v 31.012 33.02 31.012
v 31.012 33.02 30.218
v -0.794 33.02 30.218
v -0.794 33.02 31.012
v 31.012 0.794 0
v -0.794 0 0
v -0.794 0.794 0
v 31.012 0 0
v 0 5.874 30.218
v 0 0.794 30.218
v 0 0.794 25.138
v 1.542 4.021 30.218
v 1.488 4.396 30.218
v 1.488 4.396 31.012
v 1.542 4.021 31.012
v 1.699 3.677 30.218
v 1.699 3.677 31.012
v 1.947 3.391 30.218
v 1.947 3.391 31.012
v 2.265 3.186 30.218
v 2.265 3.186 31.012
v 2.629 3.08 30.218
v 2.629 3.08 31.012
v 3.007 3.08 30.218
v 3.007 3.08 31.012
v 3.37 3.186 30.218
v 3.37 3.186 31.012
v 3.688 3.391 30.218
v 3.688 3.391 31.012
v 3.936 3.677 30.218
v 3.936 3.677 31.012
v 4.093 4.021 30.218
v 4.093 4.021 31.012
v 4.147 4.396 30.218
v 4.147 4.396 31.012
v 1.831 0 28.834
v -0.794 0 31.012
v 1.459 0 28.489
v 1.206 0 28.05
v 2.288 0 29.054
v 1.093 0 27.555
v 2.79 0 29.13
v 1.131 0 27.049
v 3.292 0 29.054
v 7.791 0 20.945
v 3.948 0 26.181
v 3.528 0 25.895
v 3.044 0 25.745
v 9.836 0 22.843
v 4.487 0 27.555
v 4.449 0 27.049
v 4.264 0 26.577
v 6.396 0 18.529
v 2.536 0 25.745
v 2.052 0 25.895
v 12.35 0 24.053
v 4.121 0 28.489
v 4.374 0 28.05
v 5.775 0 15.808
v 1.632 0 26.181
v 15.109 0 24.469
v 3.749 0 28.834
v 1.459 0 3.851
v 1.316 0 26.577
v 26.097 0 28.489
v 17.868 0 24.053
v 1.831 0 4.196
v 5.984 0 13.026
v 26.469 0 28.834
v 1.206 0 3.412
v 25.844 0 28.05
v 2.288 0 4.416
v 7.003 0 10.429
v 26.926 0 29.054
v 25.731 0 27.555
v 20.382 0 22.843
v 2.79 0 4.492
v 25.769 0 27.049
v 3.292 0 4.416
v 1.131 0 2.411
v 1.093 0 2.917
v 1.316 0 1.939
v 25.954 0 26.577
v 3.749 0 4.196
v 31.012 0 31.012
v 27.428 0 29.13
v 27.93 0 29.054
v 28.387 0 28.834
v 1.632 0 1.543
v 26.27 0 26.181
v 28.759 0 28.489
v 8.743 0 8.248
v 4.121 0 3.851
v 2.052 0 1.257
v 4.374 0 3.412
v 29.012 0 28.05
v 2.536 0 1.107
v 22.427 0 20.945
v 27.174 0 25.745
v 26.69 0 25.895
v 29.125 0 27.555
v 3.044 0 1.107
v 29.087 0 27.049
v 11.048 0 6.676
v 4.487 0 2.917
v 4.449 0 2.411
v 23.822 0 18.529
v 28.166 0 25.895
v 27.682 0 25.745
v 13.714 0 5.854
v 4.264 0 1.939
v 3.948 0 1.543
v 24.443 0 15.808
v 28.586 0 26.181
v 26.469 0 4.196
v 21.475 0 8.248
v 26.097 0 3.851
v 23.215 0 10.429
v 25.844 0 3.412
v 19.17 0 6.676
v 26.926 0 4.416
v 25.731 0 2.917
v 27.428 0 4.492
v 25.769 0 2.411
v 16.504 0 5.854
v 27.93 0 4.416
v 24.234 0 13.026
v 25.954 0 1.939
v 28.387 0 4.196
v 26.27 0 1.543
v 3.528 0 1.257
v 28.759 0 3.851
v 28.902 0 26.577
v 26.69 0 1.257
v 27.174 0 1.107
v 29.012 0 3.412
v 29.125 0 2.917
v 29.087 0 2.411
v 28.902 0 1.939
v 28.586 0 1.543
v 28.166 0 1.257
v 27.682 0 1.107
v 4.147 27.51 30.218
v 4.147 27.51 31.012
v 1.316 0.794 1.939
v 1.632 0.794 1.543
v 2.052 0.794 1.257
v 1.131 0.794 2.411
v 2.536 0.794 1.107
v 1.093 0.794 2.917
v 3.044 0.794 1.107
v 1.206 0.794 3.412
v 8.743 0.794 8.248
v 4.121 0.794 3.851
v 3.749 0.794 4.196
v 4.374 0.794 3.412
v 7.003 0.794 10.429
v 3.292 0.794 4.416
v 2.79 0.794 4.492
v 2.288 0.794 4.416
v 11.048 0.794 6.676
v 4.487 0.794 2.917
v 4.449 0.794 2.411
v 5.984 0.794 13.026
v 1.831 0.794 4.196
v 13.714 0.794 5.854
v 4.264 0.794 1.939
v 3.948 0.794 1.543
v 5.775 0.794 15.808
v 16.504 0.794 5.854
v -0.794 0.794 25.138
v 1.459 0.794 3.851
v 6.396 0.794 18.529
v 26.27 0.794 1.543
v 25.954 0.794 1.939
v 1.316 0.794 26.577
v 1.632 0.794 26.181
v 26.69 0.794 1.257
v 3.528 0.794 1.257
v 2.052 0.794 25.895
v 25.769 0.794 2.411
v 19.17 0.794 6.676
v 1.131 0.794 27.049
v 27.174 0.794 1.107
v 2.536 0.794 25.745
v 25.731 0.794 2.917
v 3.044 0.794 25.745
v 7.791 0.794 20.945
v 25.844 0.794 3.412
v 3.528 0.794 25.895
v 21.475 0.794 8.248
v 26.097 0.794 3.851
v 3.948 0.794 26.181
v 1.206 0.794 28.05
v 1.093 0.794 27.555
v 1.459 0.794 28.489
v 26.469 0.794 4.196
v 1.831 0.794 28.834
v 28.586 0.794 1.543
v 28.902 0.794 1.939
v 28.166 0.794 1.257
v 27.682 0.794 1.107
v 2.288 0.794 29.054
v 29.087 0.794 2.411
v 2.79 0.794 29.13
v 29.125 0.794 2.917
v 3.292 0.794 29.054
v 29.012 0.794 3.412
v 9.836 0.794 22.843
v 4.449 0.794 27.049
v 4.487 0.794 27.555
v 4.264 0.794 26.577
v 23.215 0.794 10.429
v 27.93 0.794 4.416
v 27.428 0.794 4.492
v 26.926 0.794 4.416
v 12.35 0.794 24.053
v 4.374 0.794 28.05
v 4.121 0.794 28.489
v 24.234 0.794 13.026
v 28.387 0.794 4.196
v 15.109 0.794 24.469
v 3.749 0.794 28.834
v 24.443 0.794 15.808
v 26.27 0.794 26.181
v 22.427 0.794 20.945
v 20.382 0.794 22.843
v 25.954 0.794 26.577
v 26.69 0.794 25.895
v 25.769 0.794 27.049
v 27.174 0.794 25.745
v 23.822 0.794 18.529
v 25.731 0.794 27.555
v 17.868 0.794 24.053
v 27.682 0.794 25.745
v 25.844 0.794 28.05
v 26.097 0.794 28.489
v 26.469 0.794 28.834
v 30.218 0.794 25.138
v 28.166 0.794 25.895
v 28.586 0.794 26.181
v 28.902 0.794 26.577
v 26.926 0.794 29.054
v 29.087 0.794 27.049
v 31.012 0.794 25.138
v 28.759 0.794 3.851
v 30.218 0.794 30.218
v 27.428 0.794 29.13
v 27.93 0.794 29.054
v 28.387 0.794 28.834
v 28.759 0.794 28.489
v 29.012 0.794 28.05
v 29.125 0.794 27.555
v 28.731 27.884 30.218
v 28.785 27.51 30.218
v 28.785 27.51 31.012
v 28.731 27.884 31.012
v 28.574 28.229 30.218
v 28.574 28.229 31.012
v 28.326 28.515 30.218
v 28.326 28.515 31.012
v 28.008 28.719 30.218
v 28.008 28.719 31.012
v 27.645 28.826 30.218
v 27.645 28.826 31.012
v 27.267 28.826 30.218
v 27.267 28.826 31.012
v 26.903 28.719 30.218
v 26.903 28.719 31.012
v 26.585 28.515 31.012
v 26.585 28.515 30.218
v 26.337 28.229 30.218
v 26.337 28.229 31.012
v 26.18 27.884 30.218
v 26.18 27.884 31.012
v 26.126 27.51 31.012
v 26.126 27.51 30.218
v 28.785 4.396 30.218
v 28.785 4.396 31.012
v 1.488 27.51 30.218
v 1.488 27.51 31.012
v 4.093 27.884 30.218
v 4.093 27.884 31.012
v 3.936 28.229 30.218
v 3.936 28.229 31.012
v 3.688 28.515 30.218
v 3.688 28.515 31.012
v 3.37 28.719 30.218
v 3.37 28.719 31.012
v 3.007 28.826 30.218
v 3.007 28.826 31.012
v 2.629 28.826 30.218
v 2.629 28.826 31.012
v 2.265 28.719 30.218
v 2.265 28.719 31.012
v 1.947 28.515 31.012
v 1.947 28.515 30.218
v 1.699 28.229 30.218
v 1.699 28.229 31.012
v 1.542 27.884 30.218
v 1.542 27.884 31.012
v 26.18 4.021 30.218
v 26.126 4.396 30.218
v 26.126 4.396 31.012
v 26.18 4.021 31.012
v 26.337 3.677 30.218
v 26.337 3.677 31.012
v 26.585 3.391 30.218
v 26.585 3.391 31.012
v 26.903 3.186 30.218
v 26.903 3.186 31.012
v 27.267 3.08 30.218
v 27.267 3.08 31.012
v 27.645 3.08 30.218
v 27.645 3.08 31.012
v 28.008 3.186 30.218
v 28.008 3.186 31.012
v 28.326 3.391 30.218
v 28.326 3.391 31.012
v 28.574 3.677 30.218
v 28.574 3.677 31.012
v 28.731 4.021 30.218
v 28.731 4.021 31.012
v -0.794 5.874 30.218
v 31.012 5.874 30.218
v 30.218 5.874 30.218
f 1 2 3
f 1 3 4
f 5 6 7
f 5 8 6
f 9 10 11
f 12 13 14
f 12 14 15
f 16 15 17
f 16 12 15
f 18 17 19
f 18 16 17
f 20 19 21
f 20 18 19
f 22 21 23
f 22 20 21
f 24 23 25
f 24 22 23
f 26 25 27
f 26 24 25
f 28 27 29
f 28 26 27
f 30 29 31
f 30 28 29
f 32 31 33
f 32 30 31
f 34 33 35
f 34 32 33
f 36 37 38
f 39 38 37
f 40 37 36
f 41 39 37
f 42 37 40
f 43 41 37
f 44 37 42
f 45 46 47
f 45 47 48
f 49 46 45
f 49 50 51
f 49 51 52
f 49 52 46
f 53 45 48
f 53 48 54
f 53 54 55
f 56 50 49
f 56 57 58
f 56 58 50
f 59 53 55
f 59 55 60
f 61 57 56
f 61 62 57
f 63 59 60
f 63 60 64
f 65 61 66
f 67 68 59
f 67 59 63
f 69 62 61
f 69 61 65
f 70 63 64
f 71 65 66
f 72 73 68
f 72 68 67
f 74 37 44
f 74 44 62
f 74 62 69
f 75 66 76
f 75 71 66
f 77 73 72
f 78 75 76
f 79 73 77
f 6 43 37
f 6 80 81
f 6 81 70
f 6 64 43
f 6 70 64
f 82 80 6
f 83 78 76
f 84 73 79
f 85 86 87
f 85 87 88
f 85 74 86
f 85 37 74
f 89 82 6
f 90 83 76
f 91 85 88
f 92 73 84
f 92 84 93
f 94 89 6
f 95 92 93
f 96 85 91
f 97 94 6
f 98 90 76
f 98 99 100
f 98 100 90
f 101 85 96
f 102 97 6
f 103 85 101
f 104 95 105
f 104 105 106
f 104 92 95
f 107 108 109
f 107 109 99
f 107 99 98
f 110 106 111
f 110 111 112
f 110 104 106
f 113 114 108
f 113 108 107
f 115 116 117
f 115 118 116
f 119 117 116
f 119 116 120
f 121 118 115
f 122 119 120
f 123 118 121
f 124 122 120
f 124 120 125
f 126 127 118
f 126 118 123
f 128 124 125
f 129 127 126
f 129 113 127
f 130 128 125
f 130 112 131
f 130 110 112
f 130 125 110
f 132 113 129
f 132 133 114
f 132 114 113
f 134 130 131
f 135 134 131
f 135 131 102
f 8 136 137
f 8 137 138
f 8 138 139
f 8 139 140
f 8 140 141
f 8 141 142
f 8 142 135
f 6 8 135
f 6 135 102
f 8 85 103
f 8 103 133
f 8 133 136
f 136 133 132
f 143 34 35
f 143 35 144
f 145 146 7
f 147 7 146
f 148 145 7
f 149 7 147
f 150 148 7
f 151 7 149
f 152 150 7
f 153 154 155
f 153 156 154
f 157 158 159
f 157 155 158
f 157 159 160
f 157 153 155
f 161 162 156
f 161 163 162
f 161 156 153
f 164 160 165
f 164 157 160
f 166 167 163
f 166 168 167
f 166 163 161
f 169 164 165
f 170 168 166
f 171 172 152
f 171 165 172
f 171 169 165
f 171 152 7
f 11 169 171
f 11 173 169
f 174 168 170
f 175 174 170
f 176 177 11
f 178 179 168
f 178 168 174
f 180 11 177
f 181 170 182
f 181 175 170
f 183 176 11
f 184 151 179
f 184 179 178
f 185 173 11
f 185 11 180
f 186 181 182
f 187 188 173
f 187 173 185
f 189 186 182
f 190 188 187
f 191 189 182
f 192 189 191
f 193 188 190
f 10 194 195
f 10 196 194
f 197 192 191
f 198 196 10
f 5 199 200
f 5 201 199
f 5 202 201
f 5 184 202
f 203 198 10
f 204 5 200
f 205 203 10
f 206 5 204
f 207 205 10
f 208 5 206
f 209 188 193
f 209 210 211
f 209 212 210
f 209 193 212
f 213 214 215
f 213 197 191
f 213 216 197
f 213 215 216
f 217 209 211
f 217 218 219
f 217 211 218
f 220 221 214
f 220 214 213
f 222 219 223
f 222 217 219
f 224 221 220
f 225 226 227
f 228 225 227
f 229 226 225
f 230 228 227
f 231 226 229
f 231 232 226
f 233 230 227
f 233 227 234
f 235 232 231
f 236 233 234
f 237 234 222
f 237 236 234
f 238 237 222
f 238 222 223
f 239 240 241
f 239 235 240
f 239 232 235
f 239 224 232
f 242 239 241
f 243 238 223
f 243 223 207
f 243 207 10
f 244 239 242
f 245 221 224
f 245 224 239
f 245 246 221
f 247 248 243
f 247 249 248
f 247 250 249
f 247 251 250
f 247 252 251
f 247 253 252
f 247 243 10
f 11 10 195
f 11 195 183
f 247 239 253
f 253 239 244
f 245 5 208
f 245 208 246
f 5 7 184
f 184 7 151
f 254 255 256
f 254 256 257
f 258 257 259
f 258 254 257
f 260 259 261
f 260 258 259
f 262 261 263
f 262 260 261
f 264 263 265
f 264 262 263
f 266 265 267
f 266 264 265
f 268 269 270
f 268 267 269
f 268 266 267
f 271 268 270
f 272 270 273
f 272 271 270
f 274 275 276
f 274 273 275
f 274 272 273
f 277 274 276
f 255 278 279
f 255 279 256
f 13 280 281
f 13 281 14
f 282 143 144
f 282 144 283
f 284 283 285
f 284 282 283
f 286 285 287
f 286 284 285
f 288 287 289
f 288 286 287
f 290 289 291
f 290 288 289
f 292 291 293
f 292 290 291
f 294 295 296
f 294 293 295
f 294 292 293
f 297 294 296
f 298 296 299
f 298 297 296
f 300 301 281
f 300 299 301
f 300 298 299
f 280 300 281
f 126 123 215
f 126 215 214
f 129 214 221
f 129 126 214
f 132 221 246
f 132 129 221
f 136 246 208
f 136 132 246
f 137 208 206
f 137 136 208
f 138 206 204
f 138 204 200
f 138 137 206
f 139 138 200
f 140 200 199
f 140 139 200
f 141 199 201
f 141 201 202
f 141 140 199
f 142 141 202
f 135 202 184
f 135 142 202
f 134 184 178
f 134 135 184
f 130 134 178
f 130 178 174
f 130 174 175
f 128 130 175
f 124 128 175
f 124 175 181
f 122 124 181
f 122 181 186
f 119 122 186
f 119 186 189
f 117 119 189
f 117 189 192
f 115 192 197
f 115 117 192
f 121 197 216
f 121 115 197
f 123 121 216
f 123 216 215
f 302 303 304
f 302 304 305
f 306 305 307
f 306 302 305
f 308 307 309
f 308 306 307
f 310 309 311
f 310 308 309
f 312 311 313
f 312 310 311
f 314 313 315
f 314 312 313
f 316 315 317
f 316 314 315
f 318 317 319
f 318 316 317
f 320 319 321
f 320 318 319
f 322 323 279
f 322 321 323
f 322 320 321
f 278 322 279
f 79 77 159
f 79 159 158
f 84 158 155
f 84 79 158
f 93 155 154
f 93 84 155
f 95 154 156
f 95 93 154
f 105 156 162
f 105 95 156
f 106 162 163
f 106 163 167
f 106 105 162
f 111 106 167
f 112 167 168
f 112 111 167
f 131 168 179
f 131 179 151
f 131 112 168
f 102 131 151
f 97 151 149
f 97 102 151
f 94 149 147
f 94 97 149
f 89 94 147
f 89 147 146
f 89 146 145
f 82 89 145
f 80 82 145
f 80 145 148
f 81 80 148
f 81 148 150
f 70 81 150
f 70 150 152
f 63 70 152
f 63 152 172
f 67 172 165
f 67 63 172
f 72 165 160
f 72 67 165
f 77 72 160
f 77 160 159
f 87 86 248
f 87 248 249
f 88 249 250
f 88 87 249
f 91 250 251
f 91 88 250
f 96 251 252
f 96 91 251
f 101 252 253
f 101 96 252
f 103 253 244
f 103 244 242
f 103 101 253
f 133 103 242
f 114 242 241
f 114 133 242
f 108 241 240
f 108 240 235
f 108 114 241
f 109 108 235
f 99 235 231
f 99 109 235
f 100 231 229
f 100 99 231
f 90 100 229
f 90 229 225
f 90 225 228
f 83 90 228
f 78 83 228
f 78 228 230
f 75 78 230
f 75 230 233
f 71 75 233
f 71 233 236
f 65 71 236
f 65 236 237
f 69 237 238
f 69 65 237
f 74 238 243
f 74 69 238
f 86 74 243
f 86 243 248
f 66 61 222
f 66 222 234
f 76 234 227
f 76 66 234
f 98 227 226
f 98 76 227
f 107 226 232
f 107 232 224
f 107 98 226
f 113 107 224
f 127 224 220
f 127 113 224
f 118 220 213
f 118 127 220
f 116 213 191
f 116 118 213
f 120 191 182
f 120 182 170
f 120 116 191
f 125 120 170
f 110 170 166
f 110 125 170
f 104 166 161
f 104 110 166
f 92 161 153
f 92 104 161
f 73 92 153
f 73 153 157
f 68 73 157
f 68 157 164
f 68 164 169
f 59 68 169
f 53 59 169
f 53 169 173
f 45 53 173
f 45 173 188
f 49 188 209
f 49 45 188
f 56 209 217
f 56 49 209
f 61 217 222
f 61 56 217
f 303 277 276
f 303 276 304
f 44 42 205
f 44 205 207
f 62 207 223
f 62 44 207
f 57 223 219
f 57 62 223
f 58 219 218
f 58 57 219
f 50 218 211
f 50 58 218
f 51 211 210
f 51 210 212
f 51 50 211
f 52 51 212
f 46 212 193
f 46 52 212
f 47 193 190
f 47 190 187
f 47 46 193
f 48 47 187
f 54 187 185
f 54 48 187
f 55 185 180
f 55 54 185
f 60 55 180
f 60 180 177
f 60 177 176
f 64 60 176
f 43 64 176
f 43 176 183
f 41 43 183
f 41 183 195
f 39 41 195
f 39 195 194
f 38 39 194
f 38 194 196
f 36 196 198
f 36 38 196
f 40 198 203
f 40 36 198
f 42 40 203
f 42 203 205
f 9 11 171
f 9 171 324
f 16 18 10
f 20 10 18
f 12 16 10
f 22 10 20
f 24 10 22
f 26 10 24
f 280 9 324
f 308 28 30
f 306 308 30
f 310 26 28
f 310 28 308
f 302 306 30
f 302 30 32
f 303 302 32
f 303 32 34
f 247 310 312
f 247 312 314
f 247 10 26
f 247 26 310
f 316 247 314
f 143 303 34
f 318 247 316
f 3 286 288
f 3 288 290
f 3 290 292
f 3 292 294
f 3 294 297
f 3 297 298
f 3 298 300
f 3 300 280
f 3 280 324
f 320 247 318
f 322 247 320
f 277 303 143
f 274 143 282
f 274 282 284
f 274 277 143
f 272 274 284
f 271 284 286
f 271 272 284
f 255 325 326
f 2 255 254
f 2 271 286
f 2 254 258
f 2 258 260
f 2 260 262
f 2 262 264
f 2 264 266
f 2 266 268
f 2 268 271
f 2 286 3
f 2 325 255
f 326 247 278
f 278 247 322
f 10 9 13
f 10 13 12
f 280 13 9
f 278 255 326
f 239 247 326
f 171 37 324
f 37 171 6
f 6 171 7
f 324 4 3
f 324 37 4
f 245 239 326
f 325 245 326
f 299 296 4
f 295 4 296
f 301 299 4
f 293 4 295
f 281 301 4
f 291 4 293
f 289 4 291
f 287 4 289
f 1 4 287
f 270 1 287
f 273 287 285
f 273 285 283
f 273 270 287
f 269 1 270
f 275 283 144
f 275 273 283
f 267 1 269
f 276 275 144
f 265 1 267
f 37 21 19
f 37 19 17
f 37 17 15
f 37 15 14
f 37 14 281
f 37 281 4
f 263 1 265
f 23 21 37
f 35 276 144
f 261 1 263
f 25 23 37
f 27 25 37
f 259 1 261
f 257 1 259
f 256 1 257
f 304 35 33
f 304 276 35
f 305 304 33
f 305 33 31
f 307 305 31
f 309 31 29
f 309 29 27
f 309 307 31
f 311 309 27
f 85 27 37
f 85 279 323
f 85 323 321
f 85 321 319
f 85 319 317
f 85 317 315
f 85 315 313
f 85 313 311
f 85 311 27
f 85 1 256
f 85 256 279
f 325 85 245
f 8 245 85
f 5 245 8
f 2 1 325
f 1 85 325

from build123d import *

# Parameters (mm, degrees)
SKETCH1_W           = 30.2180244
SKETCH1_H           = 30.2180244
SKETCH1_R           = 9.3599
SKETCH1_R_2         = 1.7018
BOSS_EXTRUDE1_DEPTH = 0.79375
SKETCH2_W           = 30.2180244
SKETCH2_H           = 33.02
BOSS_EXTRUDE2_DEPTH = 0.79375
BOSS_EXTRUDE3_DEPTH = 0.79375
BOSS_EXTRUDE4_DEPTH = 0.79375
CUT_EXTRUDE1_DEPTH  = 55.453462241


with BuildPart() as part:
    # Sketch1 → Boss-Extrude1 (new body)
    with BuildSketch(Plane(origin=(0, 0, 0), x_dir=(1, 0, 0), z_dir=(0, 1, 0))):
        with Locations((15.1090122, -15.1090122)):
            Rectangle(SKETCH1_W, SKETCH1_H)
        with Locations(Location((15.1090122, -15.1090122, 0), (0, 0, 270))):
            Circle(SKETCH1_R, mode=Mode.SUBTRACT)
        with Locations(Location((2.7900122, -2.7900122, 0), (0, 0, 270))):
            Circle(SKETCH1_R_2, mode=Mode.SUBTRACT)
        with Locations(Location((27.4280122, -2.7900122, 0), (0, 0, 270))):
            Circle(SKETCH1_R_2, mode=Mode.SUBTRACT)
        with Locations(Location((27.4280122, -27.4280122, 0), (0, 0, 270))):
            Circle(SKETCH1_R_2, mode=Mode.SUBTRACT)
        with Locations(Location((2.7900122, -27.4280122, 0), (0, 0, 270))):
            Circle(SKETCH1_R_2, mode=Mode.SUBTRACT)
    extrude(amount=BOSS_EXTRUDE1_DEPTH)

    # Sketch2 → Boss-Extrude2 (add)
    with BuildSketch(Plane.XY.offset(30.2180244)):
        with Locations((15.1090122, 16.51)):
            Rectangle(SKETCH2_W, SKETCH2_H)
    extrude(amount=BOSS_EXTRUDE2_DEPTH)

    # Sketch3 → Boss-Extrude3 (add)
    with BuildSketch(Plane(origin=(30.2180244, 0, 0), x_dir=(0, 0, -1), z_dir=(1, 0, 0))):
        Polygon((-25.1380244, 0.79375), (-30.2180244, 5.87375), (-30.2180244, 33.02), (-31.0117744, 33.02), (-31.0117744, 0), (0, 0), (0, 0.79375), align=None)
    extrude(amount=BOSS_EXTRUDE3_DEPTH)

    # Sketch4 → Boss-Extrude4 (add)
    with BuildSketch(Plane.ZY):
        Polygon((25.1380244, 0.79375), (30.2180244, 5.87375), (30.2180244, 33.02), (31.0117744, 33.02), (31.0117744, 0), (0, 0), (0, 0.79375), align=None)
    extrude(amount=BOSS_EXTRUDE4_DEPTH)

    # Sketch5 → Cut-Extrude1 (cut, through all)
    with BuildSketch(Plane(origin=(0, 0, 30.2180244), x_dir=(-1, 0, 0), z_dir=(0, 0, -1))):
        with BuildLine():
            Line((-4.147269761, 4.395528514), (-4.147269761, 27.509830099))
            ThreePointArc((-4.147269761, 27.509830099), (-2.8177744, 28.83932546), (-1.488279039, 27.509830099))
            Line((-1.488279039, 27.509830099), (-1.488279039, 4.395528514))
            ThreePointArc((-1.488279039, 4.395528514), (-2.8177744, 3.066033153), (-4.147269761, 4.395528514))
        make_face()
        with BuildLine():
            Line((-28.785269761, 4.395528514), (-28.785269761, 27.509830099))
            ThreePointArc((-28.785269761, 27.509830099), (-27.4557744, 28.83932546), (-26.126279039, 27.509830099))
            Line((-26.126279039, 27.509830099), (-26.126279039, 4.395528514))
            ThreePointArc((-26.126279039, 4.395528514), (-27.4557744, 3.066033153), (-28.785269761, 4.395528514))
        make_face()
    extrude(amount=-CUT_EXTRUDE1_DEPTH, mode=Mode.SUBTRACT)


solid = part.part
